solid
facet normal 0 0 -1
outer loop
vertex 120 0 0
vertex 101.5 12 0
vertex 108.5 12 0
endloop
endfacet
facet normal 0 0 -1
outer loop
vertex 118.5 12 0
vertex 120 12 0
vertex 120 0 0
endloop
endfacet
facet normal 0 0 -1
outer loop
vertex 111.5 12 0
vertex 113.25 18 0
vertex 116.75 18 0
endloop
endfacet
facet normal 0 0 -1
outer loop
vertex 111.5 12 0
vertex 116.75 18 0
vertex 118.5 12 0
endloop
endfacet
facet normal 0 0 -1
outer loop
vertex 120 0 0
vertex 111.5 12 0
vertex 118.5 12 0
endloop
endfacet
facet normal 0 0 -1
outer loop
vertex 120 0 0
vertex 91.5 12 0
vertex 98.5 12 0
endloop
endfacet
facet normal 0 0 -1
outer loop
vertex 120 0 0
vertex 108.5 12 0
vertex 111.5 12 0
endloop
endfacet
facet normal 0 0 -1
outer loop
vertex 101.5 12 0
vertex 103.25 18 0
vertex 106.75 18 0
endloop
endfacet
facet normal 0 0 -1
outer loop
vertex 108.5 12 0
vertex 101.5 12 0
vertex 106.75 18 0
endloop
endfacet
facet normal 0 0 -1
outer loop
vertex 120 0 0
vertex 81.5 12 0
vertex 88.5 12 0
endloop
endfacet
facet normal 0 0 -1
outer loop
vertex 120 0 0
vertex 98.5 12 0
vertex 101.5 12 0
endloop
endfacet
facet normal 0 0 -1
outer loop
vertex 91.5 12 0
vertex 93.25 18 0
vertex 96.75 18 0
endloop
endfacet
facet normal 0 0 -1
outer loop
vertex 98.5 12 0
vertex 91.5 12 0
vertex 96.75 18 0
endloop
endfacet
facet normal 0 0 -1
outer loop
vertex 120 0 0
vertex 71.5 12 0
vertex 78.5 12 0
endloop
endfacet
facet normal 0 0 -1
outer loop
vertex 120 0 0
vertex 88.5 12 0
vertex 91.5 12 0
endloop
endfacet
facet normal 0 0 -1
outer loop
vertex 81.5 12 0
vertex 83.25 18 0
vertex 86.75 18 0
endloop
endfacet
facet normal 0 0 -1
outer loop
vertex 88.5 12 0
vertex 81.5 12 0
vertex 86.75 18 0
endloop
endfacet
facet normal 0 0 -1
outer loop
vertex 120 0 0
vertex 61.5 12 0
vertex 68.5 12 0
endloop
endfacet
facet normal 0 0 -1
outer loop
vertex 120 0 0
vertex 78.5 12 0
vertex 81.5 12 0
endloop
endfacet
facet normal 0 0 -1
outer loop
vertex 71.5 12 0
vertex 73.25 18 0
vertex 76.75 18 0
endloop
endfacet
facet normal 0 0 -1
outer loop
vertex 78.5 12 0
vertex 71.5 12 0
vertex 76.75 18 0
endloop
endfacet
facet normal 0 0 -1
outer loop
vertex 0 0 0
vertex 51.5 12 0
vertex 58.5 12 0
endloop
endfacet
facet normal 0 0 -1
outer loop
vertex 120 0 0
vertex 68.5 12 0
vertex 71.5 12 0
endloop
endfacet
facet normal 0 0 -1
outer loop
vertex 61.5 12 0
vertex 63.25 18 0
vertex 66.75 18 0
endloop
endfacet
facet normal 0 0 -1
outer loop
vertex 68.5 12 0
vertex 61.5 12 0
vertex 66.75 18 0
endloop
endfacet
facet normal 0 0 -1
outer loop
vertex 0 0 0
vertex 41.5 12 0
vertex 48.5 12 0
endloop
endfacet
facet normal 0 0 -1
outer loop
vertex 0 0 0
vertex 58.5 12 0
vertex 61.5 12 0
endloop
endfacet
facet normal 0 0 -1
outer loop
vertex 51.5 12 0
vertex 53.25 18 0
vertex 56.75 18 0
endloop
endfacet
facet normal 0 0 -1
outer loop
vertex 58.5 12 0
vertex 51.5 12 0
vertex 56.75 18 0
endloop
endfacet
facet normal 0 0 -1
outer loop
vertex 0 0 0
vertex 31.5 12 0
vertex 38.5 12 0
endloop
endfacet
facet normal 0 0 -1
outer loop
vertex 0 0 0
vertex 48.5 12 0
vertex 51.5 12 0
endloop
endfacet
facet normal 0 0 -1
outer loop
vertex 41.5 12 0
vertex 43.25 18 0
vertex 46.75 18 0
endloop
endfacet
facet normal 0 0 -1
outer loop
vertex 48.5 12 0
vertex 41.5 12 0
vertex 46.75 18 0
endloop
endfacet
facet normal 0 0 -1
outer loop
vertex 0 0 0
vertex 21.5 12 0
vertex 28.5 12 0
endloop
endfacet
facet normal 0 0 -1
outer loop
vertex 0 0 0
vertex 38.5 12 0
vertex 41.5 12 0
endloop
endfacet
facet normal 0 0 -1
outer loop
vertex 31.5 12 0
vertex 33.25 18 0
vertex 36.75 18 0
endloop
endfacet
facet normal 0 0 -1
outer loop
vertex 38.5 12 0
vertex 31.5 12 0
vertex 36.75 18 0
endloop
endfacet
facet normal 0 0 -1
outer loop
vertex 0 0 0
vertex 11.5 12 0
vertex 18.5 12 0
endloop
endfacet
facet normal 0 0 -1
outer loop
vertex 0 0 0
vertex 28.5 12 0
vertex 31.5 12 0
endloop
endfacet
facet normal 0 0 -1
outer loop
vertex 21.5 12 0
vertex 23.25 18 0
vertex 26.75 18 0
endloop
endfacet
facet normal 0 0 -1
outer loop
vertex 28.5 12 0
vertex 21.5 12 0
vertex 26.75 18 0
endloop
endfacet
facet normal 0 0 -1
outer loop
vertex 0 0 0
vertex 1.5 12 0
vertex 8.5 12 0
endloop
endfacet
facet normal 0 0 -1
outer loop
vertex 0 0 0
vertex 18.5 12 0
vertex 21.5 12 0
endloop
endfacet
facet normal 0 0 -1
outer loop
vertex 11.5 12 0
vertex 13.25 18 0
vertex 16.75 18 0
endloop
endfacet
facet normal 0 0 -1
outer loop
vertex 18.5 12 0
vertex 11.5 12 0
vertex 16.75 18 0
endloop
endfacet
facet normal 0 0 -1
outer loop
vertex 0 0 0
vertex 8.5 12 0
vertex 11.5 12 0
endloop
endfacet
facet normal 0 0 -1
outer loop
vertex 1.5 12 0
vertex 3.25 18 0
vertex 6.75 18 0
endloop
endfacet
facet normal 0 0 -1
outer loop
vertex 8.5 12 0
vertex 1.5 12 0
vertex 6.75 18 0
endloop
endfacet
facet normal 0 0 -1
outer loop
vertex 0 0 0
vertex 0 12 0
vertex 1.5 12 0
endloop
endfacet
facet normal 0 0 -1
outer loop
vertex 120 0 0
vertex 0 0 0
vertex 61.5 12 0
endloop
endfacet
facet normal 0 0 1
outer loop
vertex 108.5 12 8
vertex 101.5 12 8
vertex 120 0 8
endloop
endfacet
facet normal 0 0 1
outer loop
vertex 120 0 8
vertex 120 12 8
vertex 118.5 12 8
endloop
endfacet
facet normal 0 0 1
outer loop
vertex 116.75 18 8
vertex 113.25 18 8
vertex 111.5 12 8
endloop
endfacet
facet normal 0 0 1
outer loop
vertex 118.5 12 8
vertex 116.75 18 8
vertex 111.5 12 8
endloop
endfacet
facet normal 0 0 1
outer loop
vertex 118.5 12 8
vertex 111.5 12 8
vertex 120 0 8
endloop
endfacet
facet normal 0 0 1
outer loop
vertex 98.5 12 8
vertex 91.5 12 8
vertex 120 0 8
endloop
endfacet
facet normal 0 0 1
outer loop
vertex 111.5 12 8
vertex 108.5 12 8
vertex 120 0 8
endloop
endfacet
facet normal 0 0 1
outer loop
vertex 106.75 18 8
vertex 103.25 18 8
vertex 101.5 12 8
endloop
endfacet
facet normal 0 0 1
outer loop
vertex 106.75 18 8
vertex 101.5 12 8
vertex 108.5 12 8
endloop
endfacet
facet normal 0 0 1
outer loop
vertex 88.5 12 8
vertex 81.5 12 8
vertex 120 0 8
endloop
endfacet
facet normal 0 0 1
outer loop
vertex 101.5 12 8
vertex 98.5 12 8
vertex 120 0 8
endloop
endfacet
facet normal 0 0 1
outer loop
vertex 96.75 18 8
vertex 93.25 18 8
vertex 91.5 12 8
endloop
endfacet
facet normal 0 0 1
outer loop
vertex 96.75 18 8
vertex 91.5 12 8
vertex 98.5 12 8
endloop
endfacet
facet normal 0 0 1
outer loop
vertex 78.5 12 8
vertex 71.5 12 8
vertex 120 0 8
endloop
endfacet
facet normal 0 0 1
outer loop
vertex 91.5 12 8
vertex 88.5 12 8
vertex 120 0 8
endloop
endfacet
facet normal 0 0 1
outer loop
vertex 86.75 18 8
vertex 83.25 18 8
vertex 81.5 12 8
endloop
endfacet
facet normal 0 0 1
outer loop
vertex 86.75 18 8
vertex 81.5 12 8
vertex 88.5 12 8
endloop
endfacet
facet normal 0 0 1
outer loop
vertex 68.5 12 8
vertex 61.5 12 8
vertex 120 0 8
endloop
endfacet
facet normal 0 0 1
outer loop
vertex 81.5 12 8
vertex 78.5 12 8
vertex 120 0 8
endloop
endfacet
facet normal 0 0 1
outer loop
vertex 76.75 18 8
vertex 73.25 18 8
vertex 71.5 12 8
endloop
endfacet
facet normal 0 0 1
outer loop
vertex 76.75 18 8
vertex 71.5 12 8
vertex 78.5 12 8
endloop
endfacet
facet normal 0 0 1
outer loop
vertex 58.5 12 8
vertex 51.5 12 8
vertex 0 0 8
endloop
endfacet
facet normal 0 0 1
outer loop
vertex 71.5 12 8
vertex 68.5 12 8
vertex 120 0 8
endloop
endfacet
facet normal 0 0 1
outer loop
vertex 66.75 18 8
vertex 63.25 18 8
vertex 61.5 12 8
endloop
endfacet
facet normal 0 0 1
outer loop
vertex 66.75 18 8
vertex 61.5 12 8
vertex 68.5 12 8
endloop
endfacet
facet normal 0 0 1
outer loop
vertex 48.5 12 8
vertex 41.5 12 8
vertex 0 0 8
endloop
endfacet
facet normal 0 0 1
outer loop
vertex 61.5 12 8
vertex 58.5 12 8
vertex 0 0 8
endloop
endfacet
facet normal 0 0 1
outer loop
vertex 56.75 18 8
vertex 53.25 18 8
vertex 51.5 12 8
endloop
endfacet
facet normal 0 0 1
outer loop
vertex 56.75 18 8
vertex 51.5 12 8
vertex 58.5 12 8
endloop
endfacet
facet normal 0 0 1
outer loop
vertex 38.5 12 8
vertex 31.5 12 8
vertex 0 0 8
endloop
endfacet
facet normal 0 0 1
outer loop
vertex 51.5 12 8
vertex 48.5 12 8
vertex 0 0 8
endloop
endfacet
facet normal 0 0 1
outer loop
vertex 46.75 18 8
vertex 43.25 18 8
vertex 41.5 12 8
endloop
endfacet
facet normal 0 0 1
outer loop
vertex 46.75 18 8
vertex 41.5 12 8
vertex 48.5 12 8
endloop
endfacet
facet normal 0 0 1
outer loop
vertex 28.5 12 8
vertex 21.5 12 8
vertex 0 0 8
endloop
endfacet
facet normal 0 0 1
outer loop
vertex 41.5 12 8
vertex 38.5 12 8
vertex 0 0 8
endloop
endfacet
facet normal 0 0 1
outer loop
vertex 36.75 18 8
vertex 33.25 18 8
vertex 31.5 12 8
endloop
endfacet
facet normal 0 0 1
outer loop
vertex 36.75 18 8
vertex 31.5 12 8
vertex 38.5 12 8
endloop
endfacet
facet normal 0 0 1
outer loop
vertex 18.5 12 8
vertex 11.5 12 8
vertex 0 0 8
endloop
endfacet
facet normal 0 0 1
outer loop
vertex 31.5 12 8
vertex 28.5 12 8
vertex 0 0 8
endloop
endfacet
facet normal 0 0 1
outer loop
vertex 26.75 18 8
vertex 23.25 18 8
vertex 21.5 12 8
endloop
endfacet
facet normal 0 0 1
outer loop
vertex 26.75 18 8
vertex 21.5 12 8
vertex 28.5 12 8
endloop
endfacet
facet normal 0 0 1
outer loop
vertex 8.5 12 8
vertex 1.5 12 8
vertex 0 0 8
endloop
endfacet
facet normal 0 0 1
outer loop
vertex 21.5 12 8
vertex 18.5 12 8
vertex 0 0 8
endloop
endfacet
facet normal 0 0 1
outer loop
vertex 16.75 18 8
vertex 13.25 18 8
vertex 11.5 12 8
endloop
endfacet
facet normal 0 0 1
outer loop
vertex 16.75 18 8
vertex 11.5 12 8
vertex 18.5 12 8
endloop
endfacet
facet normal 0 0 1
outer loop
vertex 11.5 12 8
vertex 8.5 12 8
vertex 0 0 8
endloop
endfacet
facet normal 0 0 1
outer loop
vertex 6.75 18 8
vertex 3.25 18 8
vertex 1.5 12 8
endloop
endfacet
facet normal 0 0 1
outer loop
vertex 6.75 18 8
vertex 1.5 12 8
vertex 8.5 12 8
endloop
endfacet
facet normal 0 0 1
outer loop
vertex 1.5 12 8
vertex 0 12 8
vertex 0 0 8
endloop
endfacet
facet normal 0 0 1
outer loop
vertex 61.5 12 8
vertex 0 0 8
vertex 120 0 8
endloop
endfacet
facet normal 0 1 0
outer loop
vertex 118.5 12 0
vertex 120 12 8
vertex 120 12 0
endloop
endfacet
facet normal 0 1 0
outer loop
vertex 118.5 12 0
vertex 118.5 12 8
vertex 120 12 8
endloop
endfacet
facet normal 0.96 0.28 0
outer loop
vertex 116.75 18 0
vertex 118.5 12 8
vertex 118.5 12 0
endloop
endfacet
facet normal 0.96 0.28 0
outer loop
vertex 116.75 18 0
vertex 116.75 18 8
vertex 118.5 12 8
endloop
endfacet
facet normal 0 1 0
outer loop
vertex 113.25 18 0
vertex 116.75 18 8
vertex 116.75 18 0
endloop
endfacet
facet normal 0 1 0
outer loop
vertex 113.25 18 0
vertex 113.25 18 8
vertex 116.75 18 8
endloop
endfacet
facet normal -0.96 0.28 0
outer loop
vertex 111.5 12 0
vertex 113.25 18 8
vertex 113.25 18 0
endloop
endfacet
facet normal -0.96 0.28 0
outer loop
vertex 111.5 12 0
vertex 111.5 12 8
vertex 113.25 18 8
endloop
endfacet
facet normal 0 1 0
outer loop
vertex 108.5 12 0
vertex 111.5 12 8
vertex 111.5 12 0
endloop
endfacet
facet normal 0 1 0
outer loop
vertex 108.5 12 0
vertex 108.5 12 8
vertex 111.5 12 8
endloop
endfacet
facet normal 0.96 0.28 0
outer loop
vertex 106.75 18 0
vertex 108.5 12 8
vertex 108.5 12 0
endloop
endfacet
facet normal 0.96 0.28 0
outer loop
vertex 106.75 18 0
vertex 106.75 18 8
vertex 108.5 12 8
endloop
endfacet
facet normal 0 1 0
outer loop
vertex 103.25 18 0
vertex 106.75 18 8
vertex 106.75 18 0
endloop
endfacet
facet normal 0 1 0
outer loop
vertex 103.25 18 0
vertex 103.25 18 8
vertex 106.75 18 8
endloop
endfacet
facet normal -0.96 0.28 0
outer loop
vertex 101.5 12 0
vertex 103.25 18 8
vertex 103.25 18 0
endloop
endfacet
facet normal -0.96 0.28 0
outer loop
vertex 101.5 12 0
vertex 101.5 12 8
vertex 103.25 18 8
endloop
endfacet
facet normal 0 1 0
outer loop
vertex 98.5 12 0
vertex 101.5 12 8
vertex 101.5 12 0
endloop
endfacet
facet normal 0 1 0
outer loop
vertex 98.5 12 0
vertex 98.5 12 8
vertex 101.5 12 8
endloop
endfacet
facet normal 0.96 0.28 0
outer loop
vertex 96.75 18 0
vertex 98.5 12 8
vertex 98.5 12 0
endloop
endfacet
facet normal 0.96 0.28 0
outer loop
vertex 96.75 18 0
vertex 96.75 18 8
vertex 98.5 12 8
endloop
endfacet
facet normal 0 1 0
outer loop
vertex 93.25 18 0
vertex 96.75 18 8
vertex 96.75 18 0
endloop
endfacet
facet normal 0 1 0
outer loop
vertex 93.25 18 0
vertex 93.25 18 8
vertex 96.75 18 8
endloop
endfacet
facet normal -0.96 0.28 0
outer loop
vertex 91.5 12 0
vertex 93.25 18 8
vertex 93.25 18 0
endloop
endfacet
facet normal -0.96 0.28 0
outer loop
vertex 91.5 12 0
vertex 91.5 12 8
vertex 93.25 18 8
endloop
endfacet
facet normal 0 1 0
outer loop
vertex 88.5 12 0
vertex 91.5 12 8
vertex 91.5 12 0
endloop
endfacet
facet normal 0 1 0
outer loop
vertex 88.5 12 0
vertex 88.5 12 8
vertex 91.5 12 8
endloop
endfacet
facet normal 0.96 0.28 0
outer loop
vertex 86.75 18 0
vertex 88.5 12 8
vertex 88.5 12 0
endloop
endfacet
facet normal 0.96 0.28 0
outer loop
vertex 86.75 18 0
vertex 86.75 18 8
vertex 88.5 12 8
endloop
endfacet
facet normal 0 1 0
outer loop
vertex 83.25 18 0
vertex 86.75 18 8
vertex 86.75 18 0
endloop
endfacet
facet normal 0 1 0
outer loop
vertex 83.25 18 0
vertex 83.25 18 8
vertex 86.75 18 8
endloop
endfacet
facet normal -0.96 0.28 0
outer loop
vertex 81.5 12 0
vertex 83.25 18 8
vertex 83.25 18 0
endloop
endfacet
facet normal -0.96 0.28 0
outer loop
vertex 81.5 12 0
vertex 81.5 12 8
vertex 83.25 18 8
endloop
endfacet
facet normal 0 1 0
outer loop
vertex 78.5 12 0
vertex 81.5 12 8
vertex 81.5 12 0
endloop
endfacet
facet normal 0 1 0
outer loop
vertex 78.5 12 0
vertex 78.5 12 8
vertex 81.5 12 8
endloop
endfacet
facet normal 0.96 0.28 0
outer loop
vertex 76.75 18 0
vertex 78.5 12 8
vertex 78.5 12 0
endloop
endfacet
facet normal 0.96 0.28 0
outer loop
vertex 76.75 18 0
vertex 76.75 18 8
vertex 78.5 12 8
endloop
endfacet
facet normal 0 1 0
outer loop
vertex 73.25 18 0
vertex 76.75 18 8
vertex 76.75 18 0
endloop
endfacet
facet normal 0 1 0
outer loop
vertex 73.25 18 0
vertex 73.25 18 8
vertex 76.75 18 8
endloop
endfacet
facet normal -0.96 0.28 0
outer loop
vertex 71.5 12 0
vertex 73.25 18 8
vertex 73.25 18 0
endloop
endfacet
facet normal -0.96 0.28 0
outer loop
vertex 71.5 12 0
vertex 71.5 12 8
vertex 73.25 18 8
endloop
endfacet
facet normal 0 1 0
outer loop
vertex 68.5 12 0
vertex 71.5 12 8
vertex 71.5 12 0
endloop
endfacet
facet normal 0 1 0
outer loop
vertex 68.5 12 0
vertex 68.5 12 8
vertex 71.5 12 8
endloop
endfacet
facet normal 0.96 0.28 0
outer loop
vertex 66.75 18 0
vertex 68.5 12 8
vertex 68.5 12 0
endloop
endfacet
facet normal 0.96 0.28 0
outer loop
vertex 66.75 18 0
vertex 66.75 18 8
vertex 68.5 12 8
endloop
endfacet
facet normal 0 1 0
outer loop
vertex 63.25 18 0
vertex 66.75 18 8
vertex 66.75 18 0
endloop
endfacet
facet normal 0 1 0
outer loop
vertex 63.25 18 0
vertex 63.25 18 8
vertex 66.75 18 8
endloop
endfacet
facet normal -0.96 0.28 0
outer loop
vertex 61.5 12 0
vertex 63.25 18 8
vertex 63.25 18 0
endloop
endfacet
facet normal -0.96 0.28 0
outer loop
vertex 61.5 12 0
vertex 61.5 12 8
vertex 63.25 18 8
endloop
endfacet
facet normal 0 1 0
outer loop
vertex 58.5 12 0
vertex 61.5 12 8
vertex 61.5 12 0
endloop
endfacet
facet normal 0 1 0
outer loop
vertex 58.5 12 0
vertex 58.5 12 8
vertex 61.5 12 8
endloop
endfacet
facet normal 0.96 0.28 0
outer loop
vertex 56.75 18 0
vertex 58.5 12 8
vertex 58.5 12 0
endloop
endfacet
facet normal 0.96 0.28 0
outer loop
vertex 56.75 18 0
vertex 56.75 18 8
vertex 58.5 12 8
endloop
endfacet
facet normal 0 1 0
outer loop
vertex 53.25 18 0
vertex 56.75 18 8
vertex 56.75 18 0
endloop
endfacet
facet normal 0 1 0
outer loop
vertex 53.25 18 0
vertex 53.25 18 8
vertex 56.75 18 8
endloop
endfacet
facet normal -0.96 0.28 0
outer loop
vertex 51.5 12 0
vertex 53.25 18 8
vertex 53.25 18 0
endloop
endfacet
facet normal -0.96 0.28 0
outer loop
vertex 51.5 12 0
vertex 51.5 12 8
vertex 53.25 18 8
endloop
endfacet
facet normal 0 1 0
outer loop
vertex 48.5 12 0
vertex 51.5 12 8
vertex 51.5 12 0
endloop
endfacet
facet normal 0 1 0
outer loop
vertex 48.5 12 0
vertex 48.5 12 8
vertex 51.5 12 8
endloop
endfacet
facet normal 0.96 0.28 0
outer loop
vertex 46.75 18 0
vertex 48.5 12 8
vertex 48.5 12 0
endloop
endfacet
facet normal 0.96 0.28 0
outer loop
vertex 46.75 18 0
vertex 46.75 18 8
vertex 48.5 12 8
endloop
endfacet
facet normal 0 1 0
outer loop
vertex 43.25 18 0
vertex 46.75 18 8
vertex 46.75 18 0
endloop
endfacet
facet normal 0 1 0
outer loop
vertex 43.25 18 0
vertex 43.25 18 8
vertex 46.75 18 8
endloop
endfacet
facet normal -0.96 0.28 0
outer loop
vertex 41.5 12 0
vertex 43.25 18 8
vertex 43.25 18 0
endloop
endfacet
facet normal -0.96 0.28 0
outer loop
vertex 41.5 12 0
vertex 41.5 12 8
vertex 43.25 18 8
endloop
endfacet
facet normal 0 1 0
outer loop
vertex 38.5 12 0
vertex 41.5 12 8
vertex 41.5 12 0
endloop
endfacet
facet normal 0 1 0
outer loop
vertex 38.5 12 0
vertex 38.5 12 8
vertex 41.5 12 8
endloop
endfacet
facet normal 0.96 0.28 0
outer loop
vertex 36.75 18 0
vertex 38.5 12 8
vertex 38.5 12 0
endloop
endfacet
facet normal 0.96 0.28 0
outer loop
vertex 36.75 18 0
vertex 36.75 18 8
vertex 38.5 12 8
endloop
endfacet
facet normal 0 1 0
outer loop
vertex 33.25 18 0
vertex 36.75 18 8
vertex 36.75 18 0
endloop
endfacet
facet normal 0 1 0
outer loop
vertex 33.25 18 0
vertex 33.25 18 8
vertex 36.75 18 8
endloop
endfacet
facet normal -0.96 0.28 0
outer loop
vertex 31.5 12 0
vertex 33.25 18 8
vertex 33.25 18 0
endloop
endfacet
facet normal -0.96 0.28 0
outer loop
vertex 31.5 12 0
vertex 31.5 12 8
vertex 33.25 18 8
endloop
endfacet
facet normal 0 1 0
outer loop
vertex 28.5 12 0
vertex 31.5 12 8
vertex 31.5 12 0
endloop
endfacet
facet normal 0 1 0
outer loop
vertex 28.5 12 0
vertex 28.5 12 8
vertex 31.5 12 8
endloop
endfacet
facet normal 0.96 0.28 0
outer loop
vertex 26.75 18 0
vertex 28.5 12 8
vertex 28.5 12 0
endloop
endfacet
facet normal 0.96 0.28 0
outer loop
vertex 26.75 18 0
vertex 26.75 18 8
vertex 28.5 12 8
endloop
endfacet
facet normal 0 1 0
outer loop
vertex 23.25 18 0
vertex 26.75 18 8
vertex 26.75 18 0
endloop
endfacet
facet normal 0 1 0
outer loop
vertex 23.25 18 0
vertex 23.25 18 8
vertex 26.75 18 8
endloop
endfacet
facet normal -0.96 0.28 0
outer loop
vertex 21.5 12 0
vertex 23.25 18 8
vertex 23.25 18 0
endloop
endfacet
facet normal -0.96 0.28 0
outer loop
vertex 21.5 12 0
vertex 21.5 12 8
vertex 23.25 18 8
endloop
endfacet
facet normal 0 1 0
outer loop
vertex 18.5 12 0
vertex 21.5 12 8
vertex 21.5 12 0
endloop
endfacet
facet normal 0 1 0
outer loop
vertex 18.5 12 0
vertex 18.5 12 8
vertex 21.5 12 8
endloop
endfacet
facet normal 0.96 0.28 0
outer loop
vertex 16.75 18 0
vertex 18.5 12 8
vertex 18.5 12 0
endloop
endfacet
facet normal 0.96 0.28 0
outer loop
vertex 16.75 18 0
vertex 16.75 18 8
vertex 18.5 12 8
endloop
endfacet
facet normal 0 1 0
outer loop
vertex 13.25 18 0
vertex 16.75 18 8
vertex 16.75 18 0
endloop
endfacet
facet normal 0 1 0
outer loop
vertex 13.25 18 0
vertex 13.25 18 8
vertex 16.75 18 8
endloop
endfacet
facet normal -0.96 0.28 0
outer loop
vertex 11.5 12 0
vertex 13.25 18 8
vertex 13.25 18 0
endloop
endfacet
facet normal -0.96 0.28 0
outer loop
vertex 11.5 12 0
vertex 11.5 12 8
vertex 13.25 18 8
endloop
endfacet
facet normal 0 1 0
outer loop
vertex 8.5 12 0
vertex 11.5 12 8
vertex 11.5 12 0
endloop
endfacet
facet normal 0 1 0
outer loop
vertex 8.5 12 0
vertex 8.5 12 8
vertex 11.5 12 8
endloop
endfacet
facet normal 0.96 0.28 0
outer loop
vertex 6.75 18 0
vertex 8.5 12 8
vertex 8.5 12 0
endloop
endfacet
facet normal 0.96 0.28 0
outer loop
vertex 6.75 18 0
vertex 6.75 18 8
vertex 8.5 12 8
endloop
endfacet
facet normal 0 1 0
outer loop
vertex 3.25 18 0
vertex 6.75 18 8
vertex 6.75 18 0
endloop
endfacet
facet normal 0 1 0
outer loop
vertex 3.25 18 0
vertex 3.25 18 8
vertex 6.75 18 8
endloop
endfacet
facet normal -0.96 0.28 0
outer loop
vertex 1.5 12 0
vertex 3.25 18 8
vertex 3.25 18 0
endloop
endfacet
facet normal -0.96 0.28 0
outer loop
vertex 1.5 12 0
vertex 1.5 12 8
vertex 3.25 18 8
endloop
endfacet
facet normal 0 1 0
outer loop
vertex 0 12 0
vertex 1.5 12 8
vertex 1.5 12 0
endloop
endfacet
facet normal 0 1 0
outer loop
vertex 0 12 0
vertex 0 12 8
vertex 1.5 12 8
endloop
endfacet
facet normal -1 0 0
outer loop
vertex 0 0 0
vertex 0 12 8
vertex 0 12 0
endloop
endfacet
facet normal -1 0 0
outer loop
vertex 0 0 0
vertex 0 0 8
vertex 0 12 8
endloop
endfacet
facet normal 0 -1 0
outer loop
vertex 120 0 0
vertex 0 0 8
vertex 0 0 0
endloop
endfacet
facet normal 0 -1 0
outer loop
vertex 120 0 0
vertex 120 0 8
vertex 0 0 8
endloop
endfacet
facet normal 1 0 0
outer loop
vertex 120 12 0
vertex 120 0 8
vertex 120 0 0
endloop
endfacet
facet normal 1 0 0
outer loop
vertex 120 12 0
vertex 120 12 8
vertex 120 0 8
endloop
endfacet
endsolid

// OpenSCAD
$fn = 32;

// ----------------------------------------------------------------------
// Gear rack: 12 teeth, pitch 10 mm
// ----------------------------------------------------------------------

// --- parameters (mm) ---
teeth = 12;               // number of teeth
pitch = 10;               // tooth pitch, X
root_w = 7;               // tooth width at the root
tip_w = 3.5;              // tooth width at the tip
base_h = 12;              // rack body height, Y
tooth_h = 6;              // tooth height above the body
plate_t = 8;              // rack width, Z (extrusion height)

rack_l = teeth * pitch;  // overall length
total_h = base_h + tooth_h;  // overall height

profile = [[0, 0], [120, 0], [120, 12], [118.5, 12], [116.75, 18], [113.25, 18], [111.5, 12], [108.5, 12], [106.75, 18], [103.25, 18], [101.5, 12], [98.5, 12], [96.75, 18], [93.25, 18], [91.5, 12], [88.5, 12], [86.75, 18], [83.25, 18], [81.5, 12], [78.5, 12], [76.75, 18], [73.25, 18], [71.5, 12], [68.5, 12], [66.75, 18], [63.25, 18], [61.5, 12], [58.5, 12], [56.75, 18], [53.25, 18], [51.5, 12], [48.5, 12], [46.75, 18], [43.25, 18], [41.5, 12], [38.5, 12], [36.75, 18], [33.25, 18], [31.5, 12], [28.5, 12], [26.75, 18], [23.25, 18], [21.5, 12], [18.5, 12], [16.75, 18], [13.25, 18], [11.5, 12], [8.5, 12], [6.75, 18], [3.25, 18], [1.5, 12], [0, 12]];  // primary outline, 52 points, counter clockwise

// --- the one profile operation ---
linear_extrude(height = plate_t) polygon(points = profile);
